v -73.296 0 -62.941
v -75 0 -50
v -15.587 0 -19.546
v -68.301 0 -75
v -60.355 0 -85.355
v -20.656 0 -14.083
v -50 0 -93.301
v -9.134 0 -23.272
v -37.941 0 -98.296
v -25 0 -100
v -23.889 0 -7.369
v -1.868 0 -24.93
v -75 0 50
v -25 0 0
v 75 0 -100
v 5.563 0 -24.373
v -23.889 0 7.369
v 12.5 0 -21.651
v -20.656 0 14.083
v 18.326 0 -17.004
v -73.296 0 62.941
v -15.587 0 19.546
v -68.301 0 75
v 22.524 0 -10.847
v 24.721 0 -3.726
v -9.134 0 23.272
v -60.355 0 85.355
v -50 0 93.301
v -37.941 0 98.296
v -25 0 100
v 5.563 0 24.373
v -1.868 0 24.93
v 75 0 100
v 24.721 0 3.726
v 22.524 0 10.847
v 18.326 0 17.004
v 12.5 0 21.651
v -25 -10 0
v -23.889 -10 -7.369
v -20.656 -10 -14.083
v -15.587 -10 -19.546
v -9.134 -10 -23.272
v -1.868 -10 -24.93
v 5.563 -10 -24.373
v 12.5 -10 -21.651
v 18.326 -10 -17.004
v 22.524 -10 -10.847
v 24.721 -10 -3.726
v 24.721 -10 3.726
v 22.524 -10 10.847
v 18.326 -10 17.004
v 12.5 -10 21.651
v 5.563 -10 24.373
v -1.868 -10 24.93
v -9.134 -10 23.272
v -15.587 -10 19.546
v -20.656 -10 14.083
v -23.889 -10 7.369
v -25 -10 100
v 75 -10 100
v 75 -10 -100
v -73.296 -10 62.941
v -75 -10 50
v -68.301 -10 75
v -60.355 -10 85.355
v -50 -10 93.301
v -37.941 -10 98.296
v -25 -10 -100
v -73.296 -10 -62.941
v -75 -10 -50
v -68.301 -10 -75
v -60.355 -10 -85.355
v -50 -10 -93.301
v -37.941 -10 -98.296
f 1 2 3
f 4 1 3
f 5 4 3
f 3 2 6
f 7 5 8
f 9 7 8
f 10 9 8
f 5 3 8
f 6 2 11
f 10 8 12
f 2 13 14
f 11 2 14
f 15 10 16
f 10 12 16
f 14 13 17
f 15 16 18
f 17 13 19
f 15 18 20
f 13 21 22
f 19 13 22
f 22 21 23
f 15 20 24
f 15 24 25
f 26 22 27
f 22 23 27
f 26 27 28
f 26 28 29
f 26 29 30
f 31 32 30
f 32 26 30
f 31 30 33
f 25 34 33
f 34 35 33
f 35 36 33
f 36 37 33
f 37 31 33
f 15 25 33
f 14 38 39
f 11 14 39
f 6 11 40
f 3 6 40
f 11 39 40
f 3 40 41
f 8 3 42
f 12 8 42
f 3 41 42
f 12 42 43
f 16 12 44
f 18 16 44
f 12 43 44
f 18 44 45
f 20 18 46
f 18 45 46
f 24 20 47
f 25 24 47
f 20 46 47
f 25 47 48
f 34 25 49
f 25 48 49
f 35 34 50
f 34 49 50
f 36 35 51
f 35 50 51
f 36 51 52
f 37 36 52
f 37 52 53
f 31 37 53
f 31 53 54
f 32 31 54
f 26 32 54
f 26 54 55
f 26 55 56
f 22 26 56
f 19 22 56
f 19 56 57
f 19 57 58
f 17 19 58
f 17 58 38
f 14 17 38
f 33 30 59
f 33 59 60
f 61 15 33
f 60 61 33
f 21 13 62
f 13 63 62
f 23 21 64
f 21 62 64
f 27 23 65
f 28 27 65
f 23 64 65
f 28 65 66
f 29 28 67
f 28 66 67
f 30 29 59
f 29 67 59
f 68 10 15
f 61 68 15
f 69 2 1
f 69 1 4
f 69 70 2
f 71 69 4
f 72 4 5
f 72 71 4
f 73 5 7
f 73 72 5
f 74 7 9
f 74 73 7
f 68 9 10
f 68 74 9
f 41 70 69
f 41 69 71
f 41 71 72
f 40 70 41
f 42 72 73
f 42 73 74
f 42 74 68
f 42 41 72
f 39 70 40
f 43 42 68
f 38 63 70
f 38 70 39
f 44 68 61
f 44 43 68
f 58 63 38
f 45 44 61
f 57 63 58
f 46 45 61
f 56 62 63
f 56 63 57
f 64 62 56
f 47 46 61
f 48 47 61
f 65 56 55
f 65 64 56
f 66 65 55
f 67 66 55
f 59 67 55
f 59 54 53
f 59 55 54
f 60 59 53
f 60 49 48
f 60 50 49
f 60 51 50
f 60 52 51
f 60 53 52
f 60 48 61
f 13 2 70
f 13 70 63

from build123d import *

# Parameters (mm, degrees)
F0_W     = 150
F0_H     = 200
F1_DEPTH = 10
F2_R     = 50
F4_D     = 50


with BuildPart() as f1:
    # F0 (on Front) → F1 (new body)
    with BuildSketch(Plane.XZ):
        Rectangle(F0_W, F0_H)
    extrude(amount=F1_DEPTH)

    # F2
    f2_edges = [f1.edges().sort_by_distance(p)[0] for p in [
        (-75, -5, 100),
        (-75, -5, -100),
    ]]
    fillet(f2_edges, radius=F2_R)

    # F4 (through all)
    with Locations(Plane(origin=(0, 0, 0), x_dir=(1, 0, 0), z_dir=(0, 1, 0))):
        with Locations((0, 0)):
            Hole(F4_D / 2)


solid = f1.part
